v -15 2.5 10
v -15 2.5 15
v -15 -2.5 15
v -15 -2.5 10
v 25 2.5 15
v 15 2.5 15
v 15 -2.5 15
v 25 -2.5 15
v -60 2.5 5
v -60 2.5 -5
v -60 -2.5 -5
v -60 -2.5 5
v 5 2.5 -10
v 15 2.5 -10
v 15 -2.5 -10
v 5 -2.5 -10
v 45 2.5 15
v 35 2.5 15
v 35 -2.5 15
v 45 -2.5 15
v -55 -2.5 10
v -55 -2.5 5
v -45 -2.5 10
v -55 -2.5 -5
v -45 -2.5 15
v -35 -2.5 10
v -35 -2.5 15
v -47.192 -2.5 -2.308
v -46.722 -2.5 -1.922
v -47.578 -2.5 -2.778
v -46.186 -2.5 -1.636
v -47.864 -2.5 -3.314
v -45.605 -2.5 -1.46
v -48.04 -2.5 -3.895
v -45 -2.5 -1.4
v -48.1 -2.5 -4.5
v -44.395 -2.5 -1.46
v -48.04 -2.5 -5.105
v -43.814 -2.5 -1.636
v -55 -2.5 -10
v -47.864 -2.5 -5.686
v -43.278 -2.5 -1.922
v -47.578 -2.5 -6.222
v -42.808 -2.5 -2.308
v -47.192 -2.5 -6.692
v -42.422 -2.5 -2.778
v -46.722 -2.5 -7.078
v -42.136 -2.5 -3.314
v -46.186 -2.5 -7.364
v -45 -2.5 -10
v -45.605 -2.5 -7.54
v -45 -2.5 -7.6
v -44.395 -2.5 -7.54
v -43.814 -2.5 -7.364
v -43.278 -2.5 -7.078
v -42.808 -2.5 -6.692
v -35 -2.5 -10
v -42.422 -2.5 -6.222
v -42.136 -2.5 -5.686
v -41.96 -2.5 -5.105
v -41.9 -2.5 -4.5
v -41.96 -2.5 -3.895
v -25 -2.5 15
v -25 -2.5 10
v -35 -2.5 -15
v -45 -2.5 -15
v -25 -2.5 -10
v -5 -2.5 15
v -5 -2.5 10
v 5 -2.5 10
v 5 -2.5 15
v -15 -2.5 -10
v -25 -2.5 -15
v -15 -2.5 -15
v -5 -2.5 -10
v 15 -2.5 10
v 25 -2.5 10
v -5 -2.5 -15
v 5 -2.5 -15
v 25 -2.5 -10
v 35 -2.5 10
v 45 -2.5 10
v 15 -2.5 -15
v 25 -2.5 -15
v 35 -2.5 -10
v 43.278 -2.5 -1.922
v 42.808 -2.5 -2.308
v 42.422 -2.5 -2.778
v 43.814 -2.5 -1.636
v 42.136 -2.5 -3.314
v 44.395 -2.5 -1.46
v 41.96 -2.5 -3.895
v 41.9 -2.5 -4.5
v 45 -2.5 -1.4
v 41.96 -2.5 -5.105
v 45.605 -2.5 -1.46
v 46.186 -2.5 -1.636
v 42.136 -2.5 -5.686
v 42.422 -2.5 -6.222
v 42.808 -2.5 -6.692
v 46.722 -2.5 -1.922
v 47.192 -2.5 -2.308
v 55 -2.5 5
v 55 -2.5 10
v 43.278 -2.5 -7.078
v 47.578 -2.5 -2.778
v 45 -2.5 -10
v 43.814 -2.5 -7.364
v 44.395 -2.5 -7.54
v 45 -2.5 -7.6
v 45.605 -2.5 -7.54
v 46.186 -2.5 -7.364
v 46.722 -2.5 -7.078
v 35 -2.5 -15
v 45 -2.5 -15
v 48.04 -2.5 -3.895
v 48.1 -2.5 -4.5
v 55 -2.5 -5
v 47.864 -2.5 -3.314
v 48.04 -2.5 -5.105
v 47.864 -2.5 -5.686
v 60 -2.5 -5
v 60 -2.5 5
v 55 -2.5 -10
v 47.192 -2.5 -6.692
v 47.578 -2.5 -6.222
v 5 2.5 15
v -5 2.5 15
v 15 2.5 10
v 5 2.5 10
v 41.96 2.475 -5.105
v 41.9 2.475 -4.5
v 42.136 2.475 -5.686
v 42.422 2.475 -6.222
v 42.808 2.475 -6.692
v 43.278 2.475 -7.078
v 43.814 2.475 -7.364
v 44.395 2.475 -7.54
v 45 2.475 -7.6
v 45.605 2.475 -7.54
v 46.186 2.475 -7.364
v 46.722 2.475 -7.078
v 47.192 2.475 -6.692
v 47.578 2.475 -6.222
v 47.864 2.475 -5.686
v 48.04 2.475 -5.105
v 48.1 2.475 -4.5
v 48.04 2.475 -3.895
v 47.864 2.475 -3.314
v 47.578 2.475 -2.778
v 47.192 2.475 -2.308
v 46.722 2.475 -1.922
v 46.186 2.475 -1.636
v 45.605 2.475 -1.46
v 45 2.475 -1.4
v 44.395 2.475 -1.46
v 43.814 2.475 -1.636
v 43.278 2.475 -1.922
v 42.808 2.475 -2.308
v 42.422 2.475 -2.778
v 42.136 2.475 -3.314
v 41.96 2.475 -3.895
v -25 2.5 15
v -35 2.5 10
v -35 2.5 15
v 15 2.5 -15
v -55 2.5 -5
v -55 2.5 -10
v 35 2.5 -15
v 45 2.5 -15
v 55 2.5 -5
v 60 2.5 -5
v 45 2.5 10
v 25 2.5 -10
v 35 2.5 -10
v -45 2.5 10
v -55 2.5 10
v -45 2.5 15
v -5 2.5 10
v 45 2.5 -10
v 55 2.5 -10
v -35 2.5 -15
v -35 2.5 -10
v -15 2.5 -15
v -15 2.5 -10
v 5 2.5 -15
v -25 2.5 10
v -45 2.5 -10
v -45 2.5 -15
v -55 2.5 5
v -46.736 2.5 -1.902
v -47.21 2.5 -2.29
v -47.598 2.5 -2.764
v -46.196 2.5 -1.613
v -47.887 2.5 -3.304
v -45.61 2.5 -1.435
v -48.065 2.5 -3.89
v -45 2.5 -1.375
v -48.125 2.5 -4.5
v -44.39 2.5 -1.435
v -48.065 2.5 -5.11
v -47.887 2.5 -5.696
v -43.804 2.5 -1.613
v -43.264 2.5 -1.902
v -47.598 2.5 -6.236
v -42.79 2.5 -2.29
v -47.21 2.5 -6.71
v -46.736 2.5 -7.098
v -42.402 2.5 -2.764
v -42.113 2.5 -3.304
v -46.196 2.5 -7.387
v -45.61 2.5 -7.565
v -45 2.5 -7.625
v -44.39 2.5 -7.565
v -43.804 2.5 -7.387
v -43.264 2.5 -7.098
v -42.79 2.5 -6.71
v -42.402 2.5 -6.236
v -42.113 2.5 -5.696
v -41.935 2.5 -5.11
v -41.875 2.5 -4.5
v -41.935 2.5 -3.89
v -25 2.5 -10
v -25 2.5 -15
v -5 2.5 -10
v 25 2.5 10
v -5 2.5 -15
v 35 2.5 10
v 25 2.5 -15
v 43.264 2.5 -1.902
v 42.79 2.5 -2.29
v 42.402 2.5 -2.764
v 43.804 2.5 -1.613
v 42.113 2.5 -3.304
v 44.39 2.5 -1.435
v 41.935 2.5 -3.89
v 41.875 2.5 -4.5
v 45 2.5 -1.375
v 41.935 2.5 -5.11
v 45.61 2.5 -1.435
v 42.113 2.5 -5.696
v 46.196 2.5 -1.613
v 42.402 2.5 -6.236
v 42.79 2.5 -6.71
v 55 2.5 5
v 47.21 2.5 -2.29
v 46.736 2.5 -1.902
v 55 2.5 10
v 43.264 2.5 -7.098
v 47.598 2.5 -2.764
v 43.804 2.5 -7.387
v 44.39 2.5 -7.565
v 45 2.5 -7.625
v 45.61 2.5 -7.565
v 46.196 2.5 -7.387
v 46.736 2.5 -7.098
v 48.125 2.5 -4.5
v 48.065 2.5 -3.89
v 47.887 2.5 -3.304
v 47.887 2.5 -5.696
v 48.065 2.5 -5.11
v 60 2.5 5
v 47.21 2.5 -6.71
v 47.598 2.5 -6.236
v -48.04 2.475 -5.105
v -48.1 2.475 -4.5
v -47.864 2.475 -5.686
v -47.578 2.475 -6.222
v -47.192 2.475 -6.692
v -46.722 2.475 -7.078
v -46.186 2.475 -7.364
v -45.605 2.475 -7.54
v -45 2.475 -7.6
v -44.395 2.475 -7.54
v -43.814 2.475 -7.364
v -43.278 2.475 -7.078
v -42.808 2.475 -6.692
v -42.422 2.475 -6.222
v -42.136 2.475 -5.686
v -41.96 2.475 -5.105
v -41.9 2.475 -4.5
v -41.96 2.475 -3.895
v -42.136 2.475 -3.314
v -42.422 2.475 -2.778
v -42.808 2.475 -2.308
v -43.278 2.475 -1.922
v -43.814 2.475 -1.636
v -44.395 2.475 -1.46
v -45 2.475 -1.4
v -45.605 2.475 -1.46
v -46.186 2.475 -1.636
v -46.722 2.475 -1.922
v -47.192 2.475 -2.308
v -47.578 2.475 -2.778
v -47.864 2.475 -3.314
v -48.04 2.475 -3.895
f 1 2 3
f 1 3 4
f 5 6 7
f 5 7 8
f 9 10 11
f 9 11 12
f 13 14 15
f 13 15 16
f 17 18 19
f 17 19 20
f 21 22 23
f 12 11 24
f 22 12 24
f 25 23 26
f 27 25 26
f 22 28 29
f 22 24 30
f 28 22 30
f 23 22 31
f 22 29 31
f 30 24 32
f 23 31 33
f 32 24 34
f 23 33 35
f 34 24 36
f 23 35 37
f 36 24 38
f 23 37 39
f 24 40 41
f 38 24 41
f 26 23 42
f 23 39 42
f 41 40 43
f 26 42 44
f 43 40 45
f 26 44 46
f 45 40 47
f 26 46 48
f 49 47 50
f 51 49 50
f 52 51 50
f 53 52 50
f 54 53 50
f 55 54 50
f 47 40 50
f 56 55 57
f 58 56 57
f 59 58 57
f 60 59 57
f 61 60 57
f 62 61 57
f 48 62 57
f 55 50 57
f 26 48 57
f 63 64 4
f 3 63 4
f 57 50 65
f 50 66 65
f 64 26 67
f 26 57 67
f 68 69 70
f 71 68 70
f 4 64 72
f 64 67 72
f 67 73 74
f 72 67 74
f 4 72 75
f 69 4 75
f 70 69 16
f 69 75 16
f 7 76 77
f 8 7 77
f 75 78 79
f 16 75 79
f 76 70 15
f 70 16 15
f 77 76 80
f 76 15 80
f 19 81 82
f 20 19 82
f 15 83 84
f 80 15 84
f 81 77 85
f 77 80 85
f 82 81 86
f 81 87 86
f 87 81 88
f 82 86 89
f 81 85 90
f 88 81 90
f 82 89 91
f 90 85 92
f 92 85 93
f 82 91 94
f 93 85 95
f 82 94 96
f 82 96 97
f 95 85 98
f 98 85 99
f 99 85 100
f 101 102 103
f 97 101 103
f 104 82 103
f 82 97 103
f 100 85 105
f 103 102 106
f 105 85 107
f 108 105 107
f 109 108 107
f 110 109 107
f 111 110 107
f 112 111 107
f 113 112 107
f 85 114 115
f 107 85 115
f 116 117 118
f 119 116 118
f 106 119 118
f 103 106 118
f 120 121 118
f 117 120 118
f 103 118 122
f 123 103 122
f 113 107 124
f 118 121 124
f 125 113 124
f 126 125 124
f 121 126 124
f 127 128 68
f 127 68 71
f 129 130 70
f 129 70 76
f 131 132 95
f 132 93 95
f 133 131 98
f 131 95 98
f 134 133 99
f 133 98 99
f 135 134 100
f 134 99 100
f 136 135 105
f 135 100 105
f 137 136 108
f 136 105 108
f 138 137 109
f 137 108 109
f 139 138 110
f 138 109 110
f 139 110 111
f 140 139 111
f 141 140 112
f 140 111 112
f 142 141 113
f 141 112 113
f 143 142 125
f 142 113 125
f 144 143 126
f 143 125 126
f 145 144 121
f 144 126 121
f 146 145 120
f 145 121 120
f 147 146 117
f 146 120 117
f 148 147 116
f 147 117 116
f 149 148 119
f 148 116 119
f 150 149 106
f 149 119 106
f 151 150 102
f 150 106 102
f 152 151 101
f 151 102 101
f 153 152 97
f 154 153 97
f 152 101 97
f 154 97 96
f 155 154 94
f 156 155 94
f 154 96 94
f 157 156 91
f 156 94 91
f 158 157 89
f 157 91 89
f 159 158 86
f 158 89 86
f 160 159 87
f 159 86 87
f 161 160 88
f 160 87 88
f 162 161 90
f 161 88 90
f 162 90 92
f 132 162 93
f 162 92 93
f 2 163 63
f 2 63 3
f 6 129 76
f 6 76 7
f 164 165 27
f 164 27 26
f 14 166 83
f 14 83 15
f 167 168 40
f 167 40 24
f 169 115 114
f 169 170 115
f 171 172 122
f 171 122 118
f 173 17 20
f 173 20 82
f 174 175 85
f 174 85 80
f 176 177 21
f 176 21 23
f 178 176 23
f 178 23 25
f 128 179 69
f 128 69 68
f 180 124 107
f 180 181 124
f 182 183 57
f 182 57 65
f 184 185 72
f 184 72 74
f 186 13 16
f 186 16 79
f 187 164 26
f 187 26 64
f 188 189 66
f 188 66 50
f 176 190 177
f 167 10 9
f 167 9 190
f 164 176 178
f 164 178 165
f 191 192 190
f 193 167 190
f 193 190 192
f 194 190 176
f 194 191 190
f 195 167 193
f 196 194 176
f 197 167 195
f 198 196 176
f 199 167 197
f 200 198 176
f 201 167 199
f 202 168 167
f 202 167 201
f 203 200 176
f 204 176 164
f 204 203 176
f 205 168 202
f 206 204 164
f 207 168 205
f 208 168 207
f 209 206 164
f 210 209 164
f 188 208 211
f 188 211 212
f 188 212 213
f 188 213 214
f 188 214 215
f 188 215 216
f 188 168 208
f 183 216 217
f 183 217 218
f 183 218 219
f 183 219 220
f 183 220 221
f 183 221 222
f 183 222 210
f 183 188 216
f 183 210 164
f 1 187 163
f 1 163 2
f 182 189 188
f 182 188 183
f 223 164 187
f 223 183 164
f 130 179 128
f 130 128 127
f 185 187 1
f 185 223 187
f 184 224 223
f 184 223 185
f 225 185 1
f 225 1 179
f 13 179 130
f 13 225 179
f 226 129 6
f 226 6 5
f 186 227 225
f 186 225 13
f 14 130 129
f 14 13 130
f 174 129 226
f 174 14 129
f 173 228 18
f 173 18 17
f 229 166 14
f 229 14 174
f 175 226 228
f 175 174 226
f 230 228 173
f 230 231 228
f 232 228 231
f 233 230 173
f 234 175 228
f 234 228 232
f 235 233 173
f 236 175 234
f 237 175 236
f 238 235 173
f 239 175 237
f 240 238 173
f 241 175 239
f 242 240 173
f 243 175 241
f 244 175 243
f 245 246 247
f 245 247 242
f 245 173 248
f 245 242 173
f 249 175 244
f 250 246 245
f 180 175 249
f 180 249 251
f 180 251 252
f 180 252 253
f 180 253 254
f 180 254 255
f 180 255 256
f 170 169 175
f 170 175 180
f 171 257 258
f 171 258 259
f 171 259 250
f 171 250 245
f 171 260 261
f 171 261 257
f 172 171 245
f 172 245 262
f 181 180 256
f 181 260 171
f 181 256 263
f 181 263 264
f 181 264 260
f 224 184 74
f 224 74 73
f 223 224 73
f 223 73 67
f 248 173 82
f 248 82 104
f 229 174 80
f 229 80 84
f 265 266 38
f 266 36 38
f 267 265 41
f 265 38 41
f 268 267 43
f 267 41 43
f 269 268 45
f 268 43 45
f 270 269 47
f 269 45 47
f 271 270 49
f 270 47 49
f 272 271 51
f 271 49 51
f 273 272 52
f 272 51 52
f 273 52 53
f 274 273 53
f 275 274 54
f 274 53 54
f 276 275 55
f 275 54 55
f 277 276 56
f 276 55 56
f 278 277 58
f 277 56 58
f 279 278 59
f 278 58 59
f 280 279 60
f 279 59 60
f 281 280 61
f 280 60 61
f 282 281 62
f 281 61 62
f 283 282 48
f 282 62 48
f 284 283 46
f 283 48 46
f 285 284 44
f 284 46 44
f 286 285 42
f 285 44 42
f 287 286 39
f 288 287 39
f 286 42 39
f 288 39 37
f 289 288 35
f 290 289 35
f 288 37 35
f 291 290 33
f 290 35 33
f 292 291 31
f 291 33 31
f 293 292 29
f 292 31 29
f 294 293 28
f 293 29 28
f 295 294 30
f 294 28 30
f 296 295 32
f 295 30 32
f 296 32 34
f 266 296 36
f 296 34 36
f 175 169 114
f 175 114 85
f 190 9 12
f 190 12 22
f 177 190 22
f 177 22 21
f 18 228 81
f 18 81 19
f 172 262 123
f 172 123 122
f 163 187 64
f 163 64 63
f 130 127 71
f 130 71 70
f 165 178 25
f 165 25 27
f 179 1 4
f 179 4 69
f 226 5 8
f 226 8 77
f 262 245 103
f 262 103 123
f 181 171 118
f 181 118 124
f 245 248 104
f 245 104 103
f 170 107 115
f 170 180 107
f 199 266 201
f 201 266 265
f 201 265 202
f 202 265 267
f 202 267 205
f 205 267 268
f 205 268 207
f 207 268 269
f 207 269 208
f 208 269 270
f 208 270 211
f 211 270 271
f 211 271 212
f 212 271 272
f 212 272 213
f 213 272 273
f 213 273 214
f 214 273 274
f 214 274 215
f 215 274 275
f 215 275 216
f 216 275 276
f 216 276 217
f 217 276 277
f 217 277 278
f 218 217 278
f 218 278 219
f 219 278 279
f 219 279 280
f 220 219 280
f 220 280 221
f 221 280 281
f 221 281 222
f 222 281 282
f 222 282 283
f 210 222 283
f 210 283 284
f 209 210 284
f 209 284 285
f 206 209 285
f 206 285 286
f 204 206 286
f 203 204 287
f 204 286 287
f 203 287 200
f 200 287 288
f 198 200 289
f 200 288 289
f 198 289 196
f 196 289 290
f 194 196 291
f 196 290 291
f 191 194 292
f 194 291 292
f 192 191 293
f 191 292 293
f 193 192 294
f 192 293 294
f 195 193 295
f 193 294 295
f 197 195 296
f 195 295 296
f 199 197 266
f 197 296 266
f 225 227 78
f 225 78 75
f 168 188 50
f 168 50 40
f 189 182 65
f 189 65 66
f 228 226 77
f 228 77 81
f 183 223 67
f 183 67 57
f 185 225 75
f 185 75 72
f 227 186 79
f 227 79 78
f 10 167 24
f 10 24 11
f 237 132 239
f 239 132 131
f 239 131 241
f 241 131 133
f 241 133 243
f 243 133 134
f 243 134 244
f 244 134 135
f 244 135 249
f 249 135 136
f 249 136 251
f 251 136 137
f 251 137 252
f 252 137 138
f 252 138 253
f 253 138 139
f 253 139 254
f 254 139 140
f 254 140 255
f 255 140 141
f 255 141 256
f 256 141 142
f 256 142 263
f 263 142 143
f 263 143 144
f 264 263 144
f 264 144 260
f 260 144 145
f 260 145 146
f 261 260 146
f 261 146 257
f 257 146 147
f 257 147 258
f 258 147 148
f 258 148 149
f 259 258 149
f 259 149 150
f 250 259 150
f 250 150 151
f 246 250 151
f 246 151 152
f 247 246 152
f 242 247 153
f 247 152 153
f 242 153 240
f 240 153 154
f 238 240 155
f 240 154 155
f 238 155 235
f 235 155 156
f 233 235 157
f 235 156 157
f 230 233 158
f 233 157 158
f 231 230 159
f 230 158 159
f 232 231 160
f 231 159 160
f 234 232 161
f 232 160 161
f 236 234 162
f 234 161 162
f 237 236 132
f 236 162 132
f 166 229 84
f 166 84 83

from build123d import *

# Parameters (mm, degrees)
BOSS_EXTRUDE1_DEPTH                  = 2.5
F_6_2_6_2_DIAMETER_HOLE1_D           = 6.2
F_6_2_6_2_DIAMETER_HOLE1_CSINK_D     = 6.25
F_6_2_6_2_DIAMETER_HOLE1_CSINK_ANGLE = 90


with BuildPart() as part:
    # Sketch1 → Boss-Extrude1 (new, symmetric)
    with BuildSketch(Plane(origin=(0, 0, 0), x_dir=(1, 0, 0), z_dir=(0, 1, 0))):
        Polygon((45, 15), (35, 15), (35, 10), (25, 10), (25, 15), (15, 15), (15, 10), (5, 10), (5, 15), (-5, 15), (-5, 10), (-15, 10), (-15, 15), (-25, 15), (-25, 10), (-35, 10), (-35, 15), (-45, 15), (-45, 10), (-55, 10), (-55, 5), (-60, 5), (-60, -5), (-55, -5), (-55, -10), (-45, -10), (-45, -15), (-35, -15), (-35, -10), (-25, -10), (-25, -15), (-15, -15), (-15, -10), (-5, -10), (-5, -15), (5, -15), (5, -10), (15, -10), (15, -15), (25, -15), (25, -10), (35, -10), (35, -15), (45, -15), (45, -10), (55, -10), (55, -5), (60, -5), (60, 5), (55, 5), (55, 10), (45, 10), align=None)
    extrude(amount=BOSS_EXTRUDE1_DEPTH, both=True)

    # Ø6.2 (6.2) Diameter Hole1 (through all)
    with Locations(Plane(origin=(0, 2.5, 0), x_dir=(1, 0, 0), z_dir=(0, 1, 0))):
        with Locations((-45, 4.5), (45, 4.5)):
            CounterSinkHole(F_6_2_6_2_DIAMETER_HOLE1_D / 2, F_6_2_6_2_DIAMETER_HOLE1_CSINK_D / 2, counter_sink_angle=F_6_2_6_2_DIAMETER_HOLE1_CSINK_ANGLE)


solid = part.part
